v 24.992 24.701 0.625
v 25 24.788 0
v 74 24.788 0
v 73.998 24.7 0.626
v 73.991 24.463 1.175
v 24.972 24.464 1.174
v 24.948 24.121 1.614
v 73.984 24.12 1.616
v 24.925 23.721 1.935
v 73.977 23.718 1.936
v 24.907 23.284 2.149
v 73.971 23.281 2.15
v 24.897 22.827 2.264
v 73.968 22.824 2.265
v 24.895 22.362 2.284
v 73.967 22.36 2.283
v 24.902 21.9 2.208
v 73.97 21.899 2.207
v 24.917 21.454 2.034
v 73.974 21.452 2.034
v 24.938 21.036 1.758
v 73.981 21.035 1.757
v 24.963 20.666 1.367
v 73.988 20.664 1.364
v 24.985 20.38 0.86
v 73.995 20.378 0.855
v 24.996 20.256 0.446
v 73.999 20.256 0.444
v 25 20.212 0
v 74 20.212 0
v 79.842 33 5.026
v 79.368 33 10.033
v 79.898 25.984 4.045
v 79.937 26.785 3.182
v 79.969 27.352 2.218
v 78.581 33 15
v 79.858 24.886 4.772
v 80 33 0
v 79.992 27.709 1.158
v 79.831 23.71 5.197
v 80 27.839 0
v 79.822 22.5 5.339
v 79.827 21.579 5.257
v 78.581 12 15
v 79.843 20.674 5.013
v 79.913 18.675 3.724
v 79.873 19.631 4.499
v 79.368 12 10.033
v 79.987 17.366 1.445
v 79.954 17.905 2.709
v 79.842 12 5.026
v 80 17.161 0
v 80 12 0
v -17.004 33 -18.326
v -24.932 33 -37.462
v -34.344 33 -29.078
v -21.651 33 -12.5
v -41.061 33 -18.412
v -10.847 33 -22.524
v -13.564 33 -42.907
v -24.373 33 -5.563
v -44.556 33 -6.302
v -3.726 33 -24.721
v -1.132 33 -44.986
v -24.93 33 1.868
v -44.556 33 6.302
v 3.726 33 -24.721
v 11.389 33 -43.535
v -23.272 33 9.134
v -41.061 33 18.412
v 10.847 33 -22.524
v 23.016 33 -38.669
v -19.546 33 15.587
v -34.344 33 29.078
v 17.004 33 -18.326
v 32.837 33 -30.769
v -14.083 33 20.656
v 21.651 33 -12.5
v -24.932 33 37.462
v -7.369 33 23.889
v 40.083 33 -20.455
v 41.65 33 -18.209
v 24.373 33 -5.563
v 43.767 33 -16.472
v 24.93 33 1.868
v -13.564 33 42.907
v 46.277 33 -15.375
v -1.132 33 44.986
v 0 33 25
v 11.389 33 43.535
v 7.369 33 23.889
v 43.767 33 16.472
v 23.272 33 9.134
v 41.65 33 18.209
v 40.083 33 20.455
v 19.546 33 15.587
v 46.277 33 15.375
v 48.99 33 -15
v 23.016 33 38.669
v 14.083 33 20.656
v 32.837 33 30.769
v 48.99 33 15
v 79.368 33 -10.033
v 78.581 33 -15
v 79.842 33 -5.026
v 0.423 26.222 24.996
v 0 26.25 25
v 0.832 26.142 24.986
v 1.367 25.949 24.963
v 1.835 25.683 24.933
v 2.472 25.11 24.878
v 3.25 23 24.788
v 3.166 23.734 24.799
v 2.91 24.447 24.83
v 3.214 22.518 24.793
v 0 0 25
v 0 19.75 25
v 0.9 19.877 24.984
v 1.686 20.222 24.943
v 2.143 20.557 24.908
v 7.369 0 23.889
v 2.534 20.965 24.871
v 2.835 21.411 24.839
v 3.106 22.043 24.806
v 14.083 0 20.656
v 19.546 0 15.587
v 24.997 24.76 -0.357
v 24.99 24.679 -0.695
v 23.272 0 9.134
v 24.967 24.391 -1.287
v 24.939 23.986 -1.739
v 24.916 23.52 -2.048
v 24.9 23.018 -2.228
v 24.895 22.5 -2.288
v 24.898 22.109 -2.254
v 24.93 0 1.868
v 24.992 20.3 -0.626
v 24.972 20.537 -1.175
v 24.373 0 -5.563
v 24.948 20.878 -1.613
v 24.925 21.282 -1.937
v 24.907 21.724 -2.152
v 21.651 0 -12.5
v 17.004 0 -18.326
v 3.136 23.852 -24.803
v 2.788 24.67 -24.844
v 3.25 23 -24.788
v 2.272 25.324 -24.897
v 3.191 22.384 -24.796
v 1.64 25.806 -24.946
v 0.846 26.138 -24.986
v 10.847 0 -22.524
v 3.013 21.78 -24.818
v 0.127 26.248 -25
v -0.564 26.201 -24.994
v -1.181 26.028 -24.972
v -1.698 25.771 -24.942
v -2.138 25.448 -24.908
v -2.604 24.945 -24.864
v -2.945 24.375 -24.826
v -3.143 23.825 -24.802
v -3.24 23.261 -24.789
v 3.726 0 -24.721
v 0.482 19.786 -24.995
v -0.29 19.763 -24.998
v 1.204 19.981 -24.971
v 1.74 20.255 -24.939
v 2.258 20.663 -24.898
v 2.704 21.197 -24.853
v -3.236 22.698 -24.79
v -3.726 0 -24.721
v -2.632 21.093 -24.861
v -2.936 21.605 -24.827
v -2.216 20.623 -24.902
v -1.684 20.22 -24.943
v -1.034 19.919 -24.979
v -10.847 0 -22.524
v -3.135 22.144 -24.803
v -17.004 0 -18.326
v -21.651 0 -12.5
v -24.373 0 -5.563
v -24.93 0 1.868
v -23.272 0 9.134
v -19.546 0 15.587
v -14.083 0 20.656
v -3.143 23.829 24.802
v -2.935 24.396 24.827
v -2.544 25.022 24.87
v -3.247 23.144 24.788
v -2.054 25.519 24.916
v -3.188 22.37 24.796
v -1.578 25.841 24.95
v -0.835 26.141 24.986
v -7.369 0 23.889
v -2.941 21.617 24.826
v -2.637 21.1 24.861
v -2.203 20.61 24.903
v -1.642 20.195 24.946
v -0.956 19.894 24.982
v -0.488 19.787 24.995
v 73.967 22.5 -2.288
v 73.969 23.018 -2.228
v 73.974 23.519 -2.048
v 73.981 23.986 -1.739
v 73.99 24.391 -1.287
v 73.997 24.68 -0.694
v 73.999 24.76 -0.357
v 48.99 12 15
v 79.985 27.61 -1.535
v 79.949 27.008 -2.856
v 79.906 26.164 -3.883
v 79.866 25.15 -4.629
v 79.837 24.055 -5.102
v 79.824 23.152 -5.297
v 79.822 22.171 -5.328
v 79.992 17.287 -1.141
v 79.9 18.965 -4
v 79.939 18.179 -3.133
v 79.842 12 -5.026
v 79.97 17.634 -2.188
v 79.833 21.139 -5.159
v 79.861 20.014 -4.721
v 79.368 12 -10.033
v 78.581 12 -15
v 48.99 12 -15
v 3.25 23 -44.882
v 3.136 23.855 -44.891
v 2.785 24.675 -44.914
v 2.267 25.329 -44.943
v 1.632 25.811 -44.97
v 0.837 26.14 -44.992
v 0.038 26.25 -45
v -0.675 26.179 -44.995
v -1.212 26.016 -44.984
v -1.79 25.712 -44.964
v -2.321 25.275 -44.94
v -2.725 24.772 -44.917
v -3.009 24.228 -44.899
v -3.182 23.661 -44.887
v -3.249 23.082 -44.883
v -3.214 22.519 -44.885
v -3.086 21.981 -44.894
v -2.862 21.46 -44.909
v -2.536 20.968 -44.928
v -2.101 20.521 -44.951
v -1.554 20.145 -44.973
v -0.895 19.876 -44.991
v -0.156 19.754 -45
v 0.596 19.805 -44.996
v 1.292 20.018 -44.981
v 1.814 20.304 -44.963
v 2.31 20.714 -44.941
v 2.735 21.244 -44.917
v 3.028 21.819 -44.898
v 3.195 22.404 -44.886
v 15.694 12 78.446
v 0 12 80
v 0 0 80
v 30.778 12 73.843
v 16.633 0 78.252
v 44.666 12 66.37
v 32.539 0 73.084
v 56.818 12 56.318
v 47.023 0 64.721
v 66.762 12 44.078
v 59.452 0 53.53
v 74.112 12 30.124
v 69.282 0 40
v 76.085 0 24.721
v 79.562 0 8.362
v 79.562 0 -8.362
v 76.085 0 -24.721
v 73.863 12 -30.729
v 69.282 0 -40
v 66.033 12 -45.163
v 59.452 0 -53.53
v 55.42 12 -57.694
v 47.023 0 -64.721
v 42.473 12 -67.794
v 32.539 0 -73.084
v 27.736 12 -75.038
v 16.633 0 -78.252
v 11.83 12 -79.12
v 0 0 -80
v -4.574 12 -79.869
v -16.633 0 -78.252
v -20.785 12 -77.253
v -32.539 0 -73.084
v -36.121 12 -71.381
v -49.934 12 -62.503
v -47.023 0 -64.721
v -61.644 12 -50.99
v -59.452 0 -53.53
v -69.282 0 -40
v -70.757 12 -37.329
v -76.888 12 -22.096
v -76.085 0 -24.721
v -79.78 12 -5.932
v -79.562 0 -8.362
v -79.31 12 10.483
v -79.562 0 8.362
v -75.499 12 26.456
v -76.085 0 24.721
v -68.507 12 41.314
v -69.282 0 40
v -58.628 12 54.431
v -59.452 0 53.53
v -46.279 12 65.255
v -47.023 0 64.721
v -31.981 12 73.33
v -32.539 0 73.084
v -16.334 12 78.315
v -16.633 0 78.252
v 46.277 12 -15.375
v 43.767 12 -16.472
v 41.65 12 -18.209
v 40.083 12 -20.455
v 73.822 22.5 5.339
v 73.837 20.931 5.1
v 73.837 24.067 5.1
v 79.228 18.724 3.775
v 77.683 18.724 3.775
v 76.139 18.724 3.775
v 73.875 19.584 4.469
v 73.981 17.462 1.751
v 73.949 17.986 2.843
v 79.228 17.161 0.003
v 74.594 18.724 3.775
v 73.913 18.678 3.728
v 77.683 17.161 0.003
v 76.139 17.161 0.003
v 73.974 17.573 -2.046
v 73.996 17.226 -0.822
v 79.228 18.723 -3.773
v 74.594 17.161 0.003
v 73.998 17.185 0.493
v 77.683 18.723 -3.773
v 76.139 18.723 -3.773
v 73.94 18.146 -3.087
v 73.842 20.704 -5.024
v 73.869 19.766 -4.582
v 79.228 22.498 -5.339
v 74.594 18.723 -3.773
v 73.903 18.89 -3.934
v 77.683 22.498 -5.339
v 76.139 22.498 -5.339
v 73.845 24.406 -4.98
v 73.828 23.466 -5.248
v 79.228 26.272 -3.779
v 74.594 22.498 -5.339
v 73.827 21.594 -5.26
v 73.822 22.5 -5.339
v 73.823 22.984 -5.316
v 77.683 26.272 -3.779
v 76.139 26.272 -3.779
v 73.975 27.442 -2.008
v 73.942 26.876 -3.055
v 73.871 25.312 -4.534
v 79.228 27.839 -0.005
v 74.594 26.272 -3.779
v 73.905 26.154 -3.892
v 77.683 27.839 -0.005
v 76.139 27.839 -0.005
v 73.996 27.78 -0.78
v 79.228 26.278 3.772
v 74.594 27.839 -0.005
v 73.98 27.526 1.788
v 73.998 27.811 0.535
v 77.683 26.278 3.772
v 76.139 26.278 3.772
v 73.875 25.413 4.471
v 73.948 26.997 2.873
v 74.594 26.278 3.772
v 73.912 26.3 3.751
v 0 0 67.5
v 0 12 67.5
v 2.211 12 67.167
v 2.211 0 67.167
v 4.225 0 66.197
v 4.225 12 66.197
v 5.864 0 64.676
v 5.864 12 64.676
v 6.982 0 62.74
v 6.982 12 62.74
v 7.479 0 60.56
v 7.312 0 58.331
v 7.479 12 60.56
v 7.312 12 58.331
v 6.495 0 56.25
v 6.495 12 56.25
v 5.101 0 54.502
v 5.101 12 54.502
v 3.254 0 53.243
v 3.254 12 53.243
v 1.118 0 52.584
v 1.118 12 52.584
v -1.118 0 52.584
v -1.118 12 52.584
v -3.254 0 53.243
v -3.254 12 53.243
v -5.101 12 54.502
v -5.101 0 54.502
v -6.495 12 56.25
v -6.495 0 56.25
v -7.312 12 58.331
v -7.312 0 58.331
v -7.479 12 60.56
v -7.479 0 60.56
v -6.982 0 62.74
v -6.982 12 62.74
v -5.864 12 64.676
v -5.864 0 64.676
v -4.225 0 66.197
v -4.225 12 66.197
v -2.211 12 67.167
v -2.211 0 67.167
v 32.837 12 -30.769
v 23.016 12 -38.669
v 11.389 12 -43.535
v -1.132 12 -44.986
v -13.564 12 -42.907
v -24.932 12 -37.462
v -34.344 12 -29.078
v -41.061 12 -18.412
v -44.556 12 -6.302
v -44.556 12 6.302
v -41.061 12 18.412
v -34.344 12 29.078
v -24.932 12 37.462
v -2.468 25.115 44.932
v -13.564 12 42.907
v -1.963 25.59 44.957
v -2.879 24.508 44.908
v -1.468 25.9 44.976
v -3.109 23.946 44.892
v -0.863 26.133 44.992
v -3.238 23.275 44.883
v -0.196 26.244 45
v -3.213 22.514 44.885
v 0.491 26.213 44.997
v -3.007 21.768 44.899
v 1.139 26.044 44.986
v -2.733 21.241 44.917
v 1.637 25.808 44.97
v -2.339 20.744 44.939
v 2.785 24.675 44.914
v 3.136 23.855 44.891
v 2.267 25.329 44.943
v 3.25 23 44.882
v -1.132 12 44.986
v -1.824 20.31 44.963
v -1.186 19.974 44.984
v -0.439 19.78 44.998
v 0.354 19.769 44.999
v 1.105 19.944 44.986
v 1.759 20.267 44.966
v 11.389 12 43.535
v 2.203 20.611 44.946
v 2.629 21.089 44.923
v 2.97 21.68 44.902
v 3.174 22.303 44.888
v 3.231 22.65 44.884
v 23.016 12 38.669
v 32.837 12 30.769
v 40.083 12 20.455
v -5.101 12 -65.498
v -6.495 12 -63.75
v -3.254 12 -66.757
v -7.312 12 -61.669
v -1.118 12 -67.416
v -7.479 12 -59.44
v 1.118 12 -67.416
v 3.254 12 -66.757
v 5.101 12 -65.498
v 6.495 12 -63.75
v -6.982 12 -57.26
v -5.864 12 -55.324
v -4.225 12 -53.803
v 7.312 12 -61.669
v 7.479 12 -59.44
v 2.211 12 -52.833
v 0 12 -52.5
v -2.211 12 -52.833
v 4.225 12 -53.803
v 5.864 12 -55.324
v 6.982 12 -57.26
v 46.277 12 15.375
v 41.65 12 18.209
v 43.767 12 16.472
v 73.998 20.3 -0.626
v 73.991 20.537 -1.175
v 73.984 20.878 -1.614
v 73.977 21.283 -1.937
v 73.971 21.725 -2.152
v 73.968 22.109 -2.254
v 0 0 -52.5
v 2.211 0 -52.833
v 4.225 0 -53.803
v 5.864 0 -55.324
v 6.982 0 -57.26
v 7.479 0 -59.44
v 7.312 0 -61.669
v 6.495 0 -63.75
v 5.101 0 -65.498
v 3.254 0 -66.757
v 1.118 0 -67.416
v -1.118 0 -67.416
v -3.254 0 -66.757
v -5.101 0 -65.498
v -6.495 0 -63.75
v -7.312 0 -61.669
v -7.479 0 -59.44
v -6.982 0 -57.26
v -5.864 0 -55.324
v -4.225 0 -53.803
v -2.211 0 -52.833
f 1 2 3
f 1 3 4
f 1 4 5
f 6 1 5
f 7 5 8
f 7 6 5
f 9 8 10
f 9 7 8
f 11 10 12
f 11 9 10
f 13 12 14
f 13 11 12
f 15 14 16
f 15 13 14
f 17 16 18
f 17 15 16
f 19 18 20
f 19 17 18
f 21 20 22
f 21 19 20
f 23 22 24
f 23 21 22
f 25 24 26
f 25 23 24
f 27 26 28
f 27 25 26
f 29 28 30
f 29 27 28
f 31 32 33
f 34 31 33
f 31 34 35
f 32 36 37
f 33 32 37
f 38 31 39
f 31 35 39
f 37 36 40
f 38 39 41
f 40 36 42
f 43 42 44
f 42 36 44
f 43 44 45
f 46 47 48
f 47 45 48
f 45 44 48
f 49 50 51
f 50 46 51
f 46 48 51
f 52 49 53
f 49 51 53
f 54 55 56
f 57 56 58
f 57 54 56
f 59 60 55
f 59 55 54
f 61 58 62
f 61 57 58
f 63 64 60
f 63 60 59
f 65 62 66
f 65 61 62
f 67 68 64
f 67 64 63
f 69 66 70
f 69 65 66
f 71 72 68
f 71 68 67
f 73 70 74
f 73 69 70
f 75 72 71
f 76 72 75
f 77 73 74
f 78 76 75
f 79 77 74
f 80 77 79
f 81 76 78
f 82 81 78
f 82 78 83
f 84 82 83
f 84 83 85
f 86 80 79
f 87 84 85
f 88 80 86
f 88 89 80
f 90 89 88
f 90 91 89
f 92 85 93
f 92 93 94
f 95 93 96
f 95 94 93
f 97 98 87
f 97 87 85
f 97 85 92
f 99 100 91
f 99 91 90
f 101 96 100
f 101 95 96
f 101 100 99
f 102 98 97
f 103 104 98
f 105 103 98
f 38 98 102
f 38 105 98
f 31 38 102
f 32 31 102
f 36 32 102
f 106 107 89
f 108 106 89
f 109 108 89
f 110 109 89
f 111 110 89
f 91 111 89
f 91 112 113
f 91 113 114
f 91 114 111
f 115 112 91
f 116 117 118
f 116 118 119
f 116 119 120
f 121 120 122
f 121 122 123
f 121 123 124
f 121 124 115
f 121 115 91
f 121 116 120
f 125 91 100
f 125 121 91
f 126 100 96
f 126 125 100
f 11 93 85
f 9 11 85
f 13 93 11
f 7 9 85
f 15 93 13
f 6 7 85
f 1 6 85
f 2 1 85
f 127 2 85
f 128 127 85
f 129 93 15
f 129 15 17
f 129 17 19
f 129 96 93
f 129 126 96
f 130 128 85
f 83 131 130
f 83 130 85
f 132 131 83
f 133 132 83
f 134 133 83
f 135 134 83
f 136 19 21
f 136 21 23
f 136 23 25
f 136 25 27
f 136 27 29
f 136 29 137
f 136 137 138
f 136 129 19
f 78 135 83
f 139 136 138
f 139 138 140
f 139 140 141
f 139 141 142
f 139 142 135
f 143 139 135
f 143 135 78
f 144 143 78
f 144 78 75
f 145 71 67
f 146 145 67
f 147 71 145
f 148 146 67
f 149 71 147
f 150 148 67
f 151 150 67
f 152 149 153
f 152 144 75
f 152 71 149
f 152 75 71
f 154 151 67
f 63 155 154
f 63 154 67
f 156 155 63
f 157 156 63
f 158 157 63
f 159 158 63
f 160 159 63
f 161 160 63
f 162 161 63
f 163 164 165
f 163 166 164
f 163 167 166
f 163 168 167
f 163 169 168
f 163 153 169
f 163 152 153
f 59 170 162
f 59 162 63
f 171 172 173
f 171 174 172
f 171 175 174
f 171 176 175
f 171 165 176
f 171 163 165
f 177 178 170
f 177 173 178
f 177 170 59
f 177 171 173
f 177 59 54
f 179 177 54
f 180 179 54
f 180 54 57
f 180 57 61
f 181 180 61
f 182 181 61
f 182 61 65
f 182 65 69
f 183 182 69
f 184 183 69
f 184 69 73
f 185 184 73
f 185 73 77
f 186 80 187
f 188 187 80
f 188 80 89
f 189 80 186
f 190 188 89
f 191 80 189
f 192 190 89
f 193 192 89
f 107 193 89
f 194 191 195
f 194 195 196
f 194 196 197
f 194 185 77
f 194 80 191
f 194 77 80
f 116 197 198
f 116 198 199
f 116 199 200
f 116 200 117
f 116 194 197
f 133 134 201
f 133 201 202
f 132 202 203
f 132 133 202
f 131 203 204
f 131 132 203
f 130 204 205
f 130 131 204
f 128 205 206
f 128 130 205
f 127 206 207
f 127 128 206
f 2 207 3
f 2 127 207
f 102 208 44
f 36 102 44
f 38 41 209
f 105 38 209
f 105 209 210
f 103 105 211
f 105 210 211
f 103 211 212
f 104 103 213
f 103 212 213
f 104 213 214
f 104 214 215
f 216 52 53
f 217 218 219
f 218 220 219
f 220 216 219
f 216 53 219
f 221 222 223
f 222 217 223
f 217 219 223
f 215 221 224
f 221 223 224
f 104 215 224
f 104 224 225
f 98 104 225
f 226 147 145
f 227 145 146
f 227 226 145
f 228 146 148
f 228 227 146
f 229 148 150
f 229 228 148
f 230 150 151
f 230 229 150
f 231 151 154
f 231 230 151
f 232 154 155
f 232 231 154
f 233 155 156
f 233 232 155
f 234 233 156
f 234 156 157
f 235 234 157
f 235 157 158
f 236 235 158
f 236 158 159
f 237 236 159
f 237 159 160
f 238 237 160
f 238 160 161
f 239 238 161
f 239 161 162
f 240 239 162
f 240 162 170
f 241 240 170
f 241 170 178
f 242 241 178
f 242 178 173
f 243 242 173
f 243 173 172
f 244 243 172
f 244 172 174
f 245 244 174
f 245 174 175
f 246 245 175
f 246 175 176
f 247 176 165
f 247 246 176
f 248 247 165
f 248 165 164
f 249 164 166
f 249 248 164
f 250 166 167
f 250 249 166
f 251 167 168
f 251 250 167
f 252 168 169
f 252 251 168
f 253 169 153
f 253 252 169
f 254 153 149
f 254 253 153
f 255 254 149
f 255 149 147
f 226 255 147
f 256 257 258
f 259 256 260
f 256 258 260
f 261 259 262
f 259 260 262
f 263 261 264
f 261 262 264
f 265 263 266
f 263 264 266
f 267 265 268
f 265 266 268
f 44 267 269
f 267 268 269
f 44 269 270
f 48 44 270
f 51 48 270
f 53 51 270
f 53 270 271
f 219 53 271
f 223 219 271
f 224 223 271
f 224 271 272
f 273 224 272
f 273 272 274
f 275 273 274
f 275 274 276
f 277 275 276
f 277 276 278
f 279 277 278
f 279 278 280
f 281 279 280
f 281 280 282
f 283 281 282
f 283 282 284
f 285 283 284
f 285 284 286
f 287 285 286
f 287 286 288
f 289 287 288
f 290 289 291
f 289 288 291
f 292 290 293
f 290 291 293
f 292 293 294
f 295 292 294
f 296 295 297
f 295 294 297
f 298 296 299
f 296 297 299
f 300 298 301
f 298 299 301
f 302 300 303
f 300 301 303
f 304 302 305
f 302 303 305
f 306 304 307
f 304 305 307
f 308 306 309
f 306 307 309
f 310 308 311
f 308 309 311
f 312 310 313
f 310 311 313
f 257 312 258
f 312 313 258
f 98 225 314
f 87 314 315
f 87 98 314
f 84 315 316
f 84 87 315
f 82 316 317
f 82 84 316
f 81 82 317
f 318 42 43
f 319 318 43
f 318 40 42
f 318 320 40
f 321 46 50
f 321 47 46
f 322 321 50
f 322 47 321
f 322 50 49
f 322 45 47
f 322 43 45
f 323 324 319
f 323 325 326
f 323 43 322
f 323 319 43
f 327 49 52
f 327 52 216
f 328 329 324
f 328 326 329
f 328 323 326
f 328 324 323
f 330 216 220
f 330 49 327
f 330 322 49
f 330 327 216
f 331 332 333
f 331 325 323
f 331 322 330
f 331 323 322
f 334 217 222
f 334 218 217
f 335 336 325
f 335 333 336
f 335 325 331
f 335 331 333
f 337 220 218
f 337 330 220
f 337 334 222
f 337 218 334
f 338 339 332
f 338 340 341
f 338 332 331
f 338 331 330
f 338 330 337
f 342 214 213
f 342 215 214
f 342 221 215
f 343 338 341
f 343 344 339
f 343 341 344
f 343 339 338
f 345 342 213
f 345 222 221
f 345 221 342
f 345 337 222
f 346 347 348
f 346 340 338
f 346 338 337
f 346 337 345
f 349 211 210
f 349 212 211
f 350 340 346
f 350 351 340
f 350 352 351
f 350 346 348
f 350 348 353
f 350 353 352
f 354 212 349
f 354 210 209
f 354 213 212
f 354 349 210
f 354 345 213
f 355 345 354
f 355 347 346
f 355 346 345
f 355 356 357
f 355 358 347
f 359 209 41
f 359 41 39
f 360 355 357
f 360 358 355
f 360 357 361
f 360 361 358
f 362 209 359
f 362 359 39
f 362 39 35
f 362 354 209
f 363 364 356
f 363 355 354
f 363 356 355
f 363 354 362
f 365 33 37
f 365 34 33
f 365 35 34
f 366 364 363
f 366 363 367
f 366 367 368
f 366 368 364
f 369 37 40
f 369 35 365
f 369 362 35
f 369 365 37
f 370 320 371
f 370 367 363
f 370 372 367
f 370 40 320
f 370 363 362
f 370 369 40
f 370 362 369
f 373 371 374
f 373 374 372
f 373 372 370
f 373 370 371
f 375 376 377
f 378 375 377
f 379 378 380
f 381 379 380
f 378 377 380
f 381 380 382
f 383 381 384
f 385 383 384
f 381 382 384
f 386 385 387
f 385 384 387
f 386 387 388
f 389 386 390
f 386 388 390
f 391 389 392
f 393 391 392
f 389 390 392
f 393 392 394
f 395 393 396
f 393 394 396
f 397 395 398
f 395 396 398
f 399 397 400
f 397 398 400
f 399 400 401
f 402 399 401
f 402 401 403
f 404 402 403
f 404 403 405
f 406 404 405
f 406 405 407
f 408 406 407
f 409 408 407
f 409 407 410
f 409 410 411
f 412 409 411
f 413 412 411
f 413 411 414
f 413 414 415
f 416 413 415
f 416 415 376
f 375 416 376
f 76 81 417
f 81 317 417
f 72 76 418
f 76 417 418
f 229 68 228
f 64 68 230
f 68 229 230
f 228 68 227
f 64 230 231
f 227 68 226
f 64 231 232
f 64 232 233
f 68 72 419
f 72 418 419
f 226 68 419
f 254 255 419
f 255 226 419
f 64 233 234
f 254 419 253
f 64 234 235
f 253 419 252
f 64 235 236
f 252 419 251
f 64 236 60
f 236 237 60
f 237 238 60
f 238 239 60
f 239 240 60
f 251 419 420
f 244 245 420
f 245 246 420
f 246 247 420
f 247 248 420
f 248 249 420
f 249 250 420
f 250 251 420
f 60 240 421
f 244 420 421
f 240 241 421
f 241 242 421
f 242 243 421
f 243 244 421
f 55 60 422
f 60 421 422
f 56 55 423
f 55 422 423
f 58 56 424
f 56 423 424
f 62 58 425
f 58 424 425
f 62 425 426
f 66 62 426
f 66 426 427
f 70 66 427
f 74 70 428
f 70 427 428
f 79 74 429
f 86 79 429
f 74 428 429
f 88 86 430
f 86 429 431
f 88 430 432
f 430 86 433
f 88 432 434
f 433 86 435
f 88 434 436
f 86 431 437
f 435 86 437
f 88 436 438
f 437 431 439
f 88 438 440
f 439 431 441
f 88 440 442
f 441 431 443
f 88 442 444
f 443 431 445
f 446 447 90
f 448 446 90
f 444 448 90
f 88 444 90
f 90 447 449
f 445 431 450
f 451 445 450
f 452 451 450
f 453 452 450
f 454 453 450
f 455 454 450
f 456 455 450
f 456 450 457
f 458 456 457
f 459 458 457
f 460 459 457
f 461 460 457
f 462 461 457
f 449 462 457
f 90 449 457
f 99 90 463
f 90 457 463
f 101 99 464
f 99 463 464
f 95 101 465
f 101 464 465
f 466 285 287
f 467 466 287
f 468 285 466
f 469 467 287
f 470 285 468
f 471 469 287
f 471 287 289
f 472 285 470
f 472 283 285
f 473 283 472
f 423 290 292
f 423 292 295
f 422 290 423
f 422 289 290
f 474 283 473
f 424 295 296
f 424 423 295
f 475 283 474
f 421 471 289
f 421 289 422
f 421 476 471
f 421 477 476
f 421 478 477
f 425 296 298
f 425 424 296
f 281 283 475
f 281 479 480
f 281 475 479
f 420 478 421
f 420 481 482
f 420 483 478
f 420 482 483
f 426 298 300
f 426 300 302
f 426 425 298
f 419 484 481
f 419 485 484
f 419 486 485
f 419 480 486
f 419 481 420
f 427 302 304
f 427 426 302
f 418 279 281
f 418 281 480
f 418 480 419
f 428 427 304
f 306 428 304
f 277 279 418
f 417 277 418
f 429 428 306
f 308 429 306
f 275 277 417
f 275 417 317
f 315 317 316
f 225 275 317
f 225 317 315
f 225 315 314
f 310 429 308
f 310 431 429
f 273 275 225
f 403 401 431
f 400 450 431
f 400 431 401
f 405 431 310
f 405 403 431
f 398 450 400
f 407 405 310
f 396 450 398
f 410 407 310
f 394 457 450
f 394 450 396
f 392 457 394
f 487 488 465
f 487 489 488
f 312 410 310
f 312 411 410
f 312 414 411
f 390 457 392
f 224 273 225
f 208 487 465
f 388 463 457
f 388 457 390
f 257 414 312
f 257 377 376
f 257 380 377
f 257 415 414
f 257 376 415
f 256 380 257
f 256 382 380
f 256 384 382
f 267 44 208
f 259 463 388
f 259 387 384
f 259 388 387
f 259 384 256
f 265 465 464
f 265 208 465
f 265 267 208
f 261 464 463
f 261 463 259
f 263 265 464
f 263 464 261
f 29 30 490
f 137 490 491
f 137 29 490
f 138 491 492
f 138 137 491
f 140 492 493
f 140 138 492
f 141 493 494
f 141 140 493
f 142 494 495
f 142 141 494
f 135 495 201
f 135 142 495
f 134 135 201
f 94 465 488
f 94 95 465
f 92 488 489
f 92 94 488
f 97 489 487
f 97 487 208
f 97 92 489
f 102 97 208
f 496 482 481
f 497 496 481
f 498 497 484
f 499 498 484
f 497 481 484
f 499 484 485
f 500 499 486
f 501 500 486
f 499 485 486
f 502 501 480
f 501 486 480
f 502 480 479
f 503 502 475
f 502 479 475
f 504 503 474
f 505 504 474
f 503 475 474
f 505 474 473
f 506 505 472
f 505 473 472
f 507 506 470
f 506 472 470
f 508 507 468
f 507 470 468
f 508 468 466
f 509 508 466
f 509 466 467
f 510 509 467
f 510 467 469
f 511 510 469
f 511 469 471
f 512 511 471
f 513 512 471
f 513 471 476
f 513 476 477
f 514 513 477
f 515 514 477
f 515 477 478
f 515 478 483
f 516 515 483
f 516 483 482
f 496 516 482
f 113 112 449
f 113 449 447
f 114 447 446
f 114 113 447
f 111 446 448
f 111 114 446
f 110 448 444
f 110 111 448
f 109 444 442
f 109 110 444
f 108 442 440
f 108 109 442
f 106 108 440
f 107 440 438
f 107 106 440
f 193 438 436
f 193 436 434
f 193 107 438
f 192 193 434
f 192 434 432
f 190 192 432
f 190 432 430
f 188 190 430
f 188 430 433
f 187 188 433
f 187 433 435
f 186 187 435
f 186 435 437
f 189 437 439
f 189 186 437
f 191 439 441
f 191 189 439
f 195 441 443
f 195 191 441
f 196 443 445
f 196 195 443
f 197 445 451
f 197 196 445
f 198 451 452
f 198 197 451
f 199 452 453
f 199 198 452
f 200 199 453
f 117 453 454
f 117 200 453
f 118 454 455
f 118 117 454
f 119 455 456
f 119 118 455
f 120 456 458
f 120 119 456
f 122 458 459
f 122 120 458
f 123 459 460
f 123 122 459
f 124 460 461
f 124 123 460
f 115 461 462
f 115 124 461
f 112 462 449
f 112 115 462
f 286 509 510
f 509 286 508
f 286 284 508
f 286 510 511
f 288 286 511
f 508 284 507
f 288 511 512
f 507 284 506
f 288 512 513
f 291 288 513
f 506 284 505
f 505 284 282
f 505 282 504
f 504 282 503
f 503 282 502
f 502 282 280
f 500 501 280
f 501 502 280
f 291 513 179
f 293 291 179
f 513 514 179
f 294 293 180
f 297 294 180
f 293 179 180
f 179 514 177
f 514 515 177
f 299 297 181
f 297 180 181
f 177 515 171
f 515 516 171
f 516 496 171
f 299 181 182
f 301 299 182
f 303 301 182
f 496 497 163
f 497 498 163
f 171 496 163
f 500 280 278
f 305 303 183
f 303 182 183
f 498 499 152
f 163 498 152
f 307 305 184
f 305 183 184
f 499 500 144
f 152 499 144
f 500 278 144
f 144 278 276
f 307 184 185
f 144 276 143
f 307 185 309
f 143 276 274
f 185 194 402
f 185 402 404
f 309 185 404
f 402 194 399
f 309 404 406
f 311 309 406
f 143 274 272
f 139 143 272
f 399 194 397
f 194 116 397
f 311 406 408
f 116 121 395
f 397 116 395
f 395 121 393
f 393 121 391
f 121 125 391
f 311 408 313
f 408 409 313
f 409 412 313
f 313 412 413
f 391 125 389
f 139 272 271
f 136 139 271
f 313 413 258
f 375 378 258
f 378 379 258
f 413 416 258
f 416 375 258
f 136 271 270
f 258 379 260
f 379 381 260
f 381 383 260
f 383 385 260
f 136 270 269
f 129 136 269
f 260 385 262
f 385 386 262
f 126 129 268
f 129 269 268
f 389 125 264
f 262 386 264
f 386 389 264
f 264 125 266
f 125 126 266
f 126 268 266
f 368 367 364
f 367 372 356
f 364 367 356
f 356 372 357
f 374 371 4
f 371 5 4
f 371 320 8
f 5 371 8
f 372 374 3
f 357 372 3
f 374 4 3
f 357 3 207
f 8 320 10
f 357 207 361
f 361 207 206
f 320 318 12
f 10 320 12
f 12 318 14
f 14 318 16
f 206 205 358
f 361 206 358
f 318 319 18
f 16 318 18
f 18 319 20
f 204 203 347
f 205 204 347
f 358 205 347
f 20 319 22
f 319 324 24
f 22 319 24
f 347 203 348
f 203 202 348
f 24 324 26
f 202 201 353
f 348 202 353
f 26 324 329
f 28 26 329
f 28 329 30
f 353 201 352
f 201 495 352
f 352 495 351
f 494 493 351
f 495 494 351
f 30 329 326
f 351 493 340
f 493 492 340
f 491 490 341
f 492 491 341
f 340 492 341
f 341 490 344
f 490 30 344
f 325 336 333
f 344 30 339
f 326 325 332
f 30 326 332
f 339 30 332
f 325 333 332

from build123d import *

# Parameters (mm, degrees)
SKETCH_1_R               = 80
EXTRUDE_1_DEPTH          = 12
SKETCH_1_3_R             = 45
SKETCH_1_3_R_2           = 25
EXTRUDE_2_DEPTH          = 33
CUT_EXTRUDE_2_DEPTH      = 118.851601601
CUT_EXTRUDE_2_DEPTH_BACK = 118.851601601
SKETCH_1_4_R             = 25
SKETCH_3_R               = 7.5
CUT_EXTRUDE_3_DEPTH      = 116.06954419
CUT_EXTRUDE_4_DEPTH      = 118.851601601
CUT_EXTRUDE_4_DEPTH_BACK = 118.851601601
SKETCH_4_R               = 3.25
EXTRUDE_3_DEPTH          = 21
FILLET_1_R               = 10
CUT_EXTRUDE_START        = 73.821646461
CUT_EXTRUDE_5_DEPTH      = 7.178353539
CUT_EXTRUDE_START_2      = 16
CUT_EXTRUDE_5_2_DEPTH    = 13
CUT_EXTRUDE_9_REACH      = 119.852
CUT_EXTRUDE_9_END_RADIUS = 80


with BuildPart() as part:
    # 草图1 → 凸台-拉伸1 (new body)
    with BuildSketch(Plane(origin=(0, 0, 0), x_dir=(1, 0, 0), z_dir=(0, 1, 0))):
        with Locations(Location((0, 0, 0), (0, 0, 270))):
            Circle(SKETCH_1_R)
    extrude(amount=EXTRUDE_1_DEPTH)

    # 草图1<3> → 凸台-拉伸2 (add)
    with BuildSketch(Plane(origin=(0, 0, 0), x_dir=(1, 0, 0), z_dir=(0, 1, 0))):
        with Locations(Location((0, 0, 0), (0, 0, 270))):
            Circle(SKETCH_1_3_R)
        with Locations(Location((0, 0, 0), (0, 0, 270))):
            Circle(SKETCH_1_3_R_2, mode=Mode.SUBTRACT)
    extrude(amount=EXTRUDE_2_DEPTH)

    # 草图1<4> → 切除-拉伸2 (cut, two sides: drawn at the far end of the back side and taken through both)
    with BuildSketch(Plane(origin=(0, 0, 0), x_dir=(1, 0, 0), z_dir=(0, 1, 0)).offset(-CUT_EXTRUDE_2_DEPTH_BACK)):
        with Locations(Location((0, 0, 0), (0, 0, 270))):
            Circle(SKETCH_1_4_R)
    extrude(amount=CUT_EXTRUDE_2_DEPTH + CUT_EXTRUDE_2_DEPTH_BACK, mode=Mode.SUBTRACT)

    # 草图3 → 切除-拉伸3 (cut, through all)
    with BuildSketch(Plane(origin=(0, 12, 0), x_dir=(1, 0, 0), z_dir=(0, 1, 0))):
        with Locations(Location((0, 60, 0), (0, 0, 270))):
            Circle(SKETCH_3_R)
        with Locations(Location((0, -60, 0), (0, 0, 270))):
            Circle(SKETCH_3_R)
    extrude(amount=-CUT_EXTRUDE_3_DEPTH, mode=Mode.SUBTRACT)

    # 草图4 → 切除-拉伸4 (cut, two sides: drawn at the far end of the back side and taken through both)
    with BuildSketch(Plane.XY.offset(-CUT_EXTRUDE_4_DEPTH_BACK)):
        with Locations((0, 23)):
            Circle(SKETCH_4_R)
    extrude(amount=CUT_EXTRUDE_4_DEPTH + CUT_EXTRUDE_4_DEPTH_BACK, mode=Mode.SUBTRACT)

    # 草图6 → 凸台-拉伸3 (add)
    with BuildSketch(Plane(origin=(0, 12, 0), x_dir=(1, 0, 0), z_dir=(0, 1, 0))):
        with BuildLine():
            ThreePointArc((42.426406871, 15), (44.351935184, 7.609589043), (45, 0))
            Line((45, 0), (80, 0))
            ThreePointArc((80, 0), (79.64450219, 7.533476681), (78.581168228, 15))
            Line((78.581168228, 15), (42.426406871, 15))
        make_face()
        with BuildLine():
            Line((80, 0), (45, 0))
            ThreePointArc((45, 0), (44.351935184, -7.609589043), (42.426406871, -15))
            Line((42.426406871, -15), (78.581168228, -15))
            ThreePointArc((78.581168228, -15), (79.64450219, -7.533476681), (80, 0))
        make_face()
    extrude(amount=EXTRUDE_3_DEPTH)

    # 圆角1
    fillet_1_edges = [part.edges().sort_by_distance(p)[0] for p in [
        (42.426406871, 22.5, 15),
        (42.426406871, 22.5, -15),
    ]]
    fillet(fillet_1_edges, radius=FILLET_1_R)

    # 切除-拉伸5: read off the stored shape, not the designer's step
    # 切除-拉伸5 outline → 切除-拉伸5 (cut)
    with BuildSketch(Plane(origin=(0, 0, 0), x_dir=(0, 0, -1), z_dir=(1, 0, 0)).offset(CUT_EXTRUDE_START)):
        with BuildLine():
            add(Edge.make_bspline(
                [(-5.338983078, 22.5), (-5.338983078, 21.088703826), (-4.759775949, 19.709126885), (-2.789970131, 17.739694705), (-1.396039111, 17.161767053), (1.390295629, 17.160268335), (2.776177958, 17.726669289), (4.77067497, 19.719260807), (5.338481287, 21.104216537), (5.339484178, 23.891942041), (4.762391942, 25.286161316), (2.795373983, 27.256990244), (1.41465075, 27.837582336), (-1.404057944, 27.840378566), (-2.786176586, 27.262719547), (-4.758291506, 25.293732162), (-5.338983078, 23.911296174), (-5.338983078, 22.5)],
                knots=[0, 0, 0, 0, 0.125, 0.125, 0.25, 0.25, 0.375, 0.375, 0.5, 0.5, 0.625, 0.625, 0.75, 0.75, 0.875, 0.875, 1, 1, 1, 1], degree=3))
        make_face()
    extrude(amount=CUT_EXTRUDE_5_DEPTH, mode=Mode.SUBTRACT)

    # Cut-Extrude 5 2 outline → Cut-Extrude 5 2 (add)
    with BuildSketch(Plane(origin=(0, 0, 0), x_dir=(1, 0, 0), z_dir=(0, 1, 0)).offset(CUT_EXTRUDE_START_2)):
        with BuildLine():
            ThreePointArc((73.821646533, -5.338983493), (74, -1.64e-07), (73.821646555, 5.338983165))
            Line((73.821646555, 5.338983165), (73.821646533, -5.338983493))
        make_face()
    extrude(amount=CUT_EXTRUDE_5_2_DEPTH)

    # 切除-拉伸9: up to this cylinder (the profile starts inside it)
    cut_extrude_9_end = Plane(origin=(-6, 22.5, 0), z_dir=(0, -1, 0)) * Cylinder(CUT_EXTRUDE_9_END_RADIUS, 400.704, mode=Mode.PRIVATE)
    # 草图8<6> → 切除-拉伸9 (cut, up to the surface)
    with BuildSketch(Plane(origin=(0, 0, 0), x_dir=(0, 0, -1), z_dir=(1, 0, 0)), mode=Mode.PRIVATE) as cut_extrude_9_sk1:
        with BuildLine():
            Line((0, 20.21230794), (0, 22.5))
            Line((0, 22.5), (0, 24.78769206))
            ThreePointArc((0, 24.78769206), (-2.28769206, 22.5), (0, 20.21230794))
        make_face()
    cut_extrude_9_tool1 = extrude(cut_extrude_9_sk1.sketch, amount=CUT_EXTRUDE_9_REACH, mode=Mode.PRIVATE) & cut_extrude_9_end
    add(cut_extrude_9_tool1.solids().sort_by_distance((0, 22.5, 0.970927))[0], mode=Mode.SUBTRACT)
    # 草图8<6> → 切除-拉伸9 (cut, up to the surface)
    with BuildSketch(Plane(origin=(0, 0, 0), x_dir=(0, 0, -1), z_dir=(1, 0, 0)), mode=Mode.PRIVATE) as cut_extrude_9_sk2:
        with BuildLine():
            Line((0, 24.78769206), (0, 22.5))
            Line((0, 22.5), (0, 20.21230794))
            ThreePointArc((0, 20.21230794), (1.617642569, 20.882357431), (2.28769206, 22.5))
            ThreePointArc((2.28769206, 22.5), (1.617642569, 24.117642569), (0, 24.78769206))
        make_face()
    cut_extrude_9_tool2 = extrude(cut_extrude_9_sk2.sketch, amount=CUT_EXTRUDE_9_REACH, mode=Mode.PRIVATE) & cut_extrude_9_end
    add(cut_extrude_9_tool2.solids().sort_by_distance((0, 22.5, -0.970927))[0], mode=Mode.SUBTRACT)
    # 草图8<6> → 切除-拉伸9 (cut, up to the surface)
    with BuildSketch(Plane(origin=(0, 0, 0), x_dir=(0, 0, -1), z_dir=(1, 0, 0)), mode=Mode.PRIVATE) as cut_extrude_9_sk3:
        with BuildLine():
            Line((0, 20.21230794), (0, 22.5))
            Line((0, 22.5), (0, 24.78769206))
            ThreePointArc((0, 24.78769206), (-2.28769206, 22.5), (0, 20.21230794))
        make_face()
    cut_extrude_9_tool3 = extrude(cut_extrude_9_sk3.sketch, amount=CUT_EXTRUDE_9_REACH, mode=Mode.PRIVATE) & cut_extrude_9_end
    add(cut_extrude_9_tool3.solids().sort_by_distance((0, 22.5, 0.970927))[0], mode=Mode.SUBTRACT)
    # 草图8<6> → 切除-拉伸9 (cut, up to the surface)
    with BuildSketch(Plane(origin=(0, 0, 0), x_dir=(0, 0, -1), z_dir=(1, 0, 0)), mode=Mode.PRIVATE) as cut_extrude_9_sk4:
        with BuildLine():
            Line((0, 24.78769206), (0, 22.5))
            Line((0, 22.5), (0, 20.21230794))
            ThreePointArc((0, 20.21230794), (1.617642569, 20.882357431), (2.28769206, 22.5))
            ThreePointArc((2.28769206, 22.5), (1.617642569, 24.117642569), (0, 24.78769206))
        make_face()
    cut_extrude_9_tool4 = extrude(cut_extrude_9_sk4.sketch, amount=CUT_EXTRUDE_9_REACH, mode=Mode.PRIVATE) & cut_extrude_9_end
    add(cut_extrude_9_tool4.solids().sort_by_distance((0, 22.5, -0.970927))[0], mode=Mode.SUBTRACT)


solid = part.part
